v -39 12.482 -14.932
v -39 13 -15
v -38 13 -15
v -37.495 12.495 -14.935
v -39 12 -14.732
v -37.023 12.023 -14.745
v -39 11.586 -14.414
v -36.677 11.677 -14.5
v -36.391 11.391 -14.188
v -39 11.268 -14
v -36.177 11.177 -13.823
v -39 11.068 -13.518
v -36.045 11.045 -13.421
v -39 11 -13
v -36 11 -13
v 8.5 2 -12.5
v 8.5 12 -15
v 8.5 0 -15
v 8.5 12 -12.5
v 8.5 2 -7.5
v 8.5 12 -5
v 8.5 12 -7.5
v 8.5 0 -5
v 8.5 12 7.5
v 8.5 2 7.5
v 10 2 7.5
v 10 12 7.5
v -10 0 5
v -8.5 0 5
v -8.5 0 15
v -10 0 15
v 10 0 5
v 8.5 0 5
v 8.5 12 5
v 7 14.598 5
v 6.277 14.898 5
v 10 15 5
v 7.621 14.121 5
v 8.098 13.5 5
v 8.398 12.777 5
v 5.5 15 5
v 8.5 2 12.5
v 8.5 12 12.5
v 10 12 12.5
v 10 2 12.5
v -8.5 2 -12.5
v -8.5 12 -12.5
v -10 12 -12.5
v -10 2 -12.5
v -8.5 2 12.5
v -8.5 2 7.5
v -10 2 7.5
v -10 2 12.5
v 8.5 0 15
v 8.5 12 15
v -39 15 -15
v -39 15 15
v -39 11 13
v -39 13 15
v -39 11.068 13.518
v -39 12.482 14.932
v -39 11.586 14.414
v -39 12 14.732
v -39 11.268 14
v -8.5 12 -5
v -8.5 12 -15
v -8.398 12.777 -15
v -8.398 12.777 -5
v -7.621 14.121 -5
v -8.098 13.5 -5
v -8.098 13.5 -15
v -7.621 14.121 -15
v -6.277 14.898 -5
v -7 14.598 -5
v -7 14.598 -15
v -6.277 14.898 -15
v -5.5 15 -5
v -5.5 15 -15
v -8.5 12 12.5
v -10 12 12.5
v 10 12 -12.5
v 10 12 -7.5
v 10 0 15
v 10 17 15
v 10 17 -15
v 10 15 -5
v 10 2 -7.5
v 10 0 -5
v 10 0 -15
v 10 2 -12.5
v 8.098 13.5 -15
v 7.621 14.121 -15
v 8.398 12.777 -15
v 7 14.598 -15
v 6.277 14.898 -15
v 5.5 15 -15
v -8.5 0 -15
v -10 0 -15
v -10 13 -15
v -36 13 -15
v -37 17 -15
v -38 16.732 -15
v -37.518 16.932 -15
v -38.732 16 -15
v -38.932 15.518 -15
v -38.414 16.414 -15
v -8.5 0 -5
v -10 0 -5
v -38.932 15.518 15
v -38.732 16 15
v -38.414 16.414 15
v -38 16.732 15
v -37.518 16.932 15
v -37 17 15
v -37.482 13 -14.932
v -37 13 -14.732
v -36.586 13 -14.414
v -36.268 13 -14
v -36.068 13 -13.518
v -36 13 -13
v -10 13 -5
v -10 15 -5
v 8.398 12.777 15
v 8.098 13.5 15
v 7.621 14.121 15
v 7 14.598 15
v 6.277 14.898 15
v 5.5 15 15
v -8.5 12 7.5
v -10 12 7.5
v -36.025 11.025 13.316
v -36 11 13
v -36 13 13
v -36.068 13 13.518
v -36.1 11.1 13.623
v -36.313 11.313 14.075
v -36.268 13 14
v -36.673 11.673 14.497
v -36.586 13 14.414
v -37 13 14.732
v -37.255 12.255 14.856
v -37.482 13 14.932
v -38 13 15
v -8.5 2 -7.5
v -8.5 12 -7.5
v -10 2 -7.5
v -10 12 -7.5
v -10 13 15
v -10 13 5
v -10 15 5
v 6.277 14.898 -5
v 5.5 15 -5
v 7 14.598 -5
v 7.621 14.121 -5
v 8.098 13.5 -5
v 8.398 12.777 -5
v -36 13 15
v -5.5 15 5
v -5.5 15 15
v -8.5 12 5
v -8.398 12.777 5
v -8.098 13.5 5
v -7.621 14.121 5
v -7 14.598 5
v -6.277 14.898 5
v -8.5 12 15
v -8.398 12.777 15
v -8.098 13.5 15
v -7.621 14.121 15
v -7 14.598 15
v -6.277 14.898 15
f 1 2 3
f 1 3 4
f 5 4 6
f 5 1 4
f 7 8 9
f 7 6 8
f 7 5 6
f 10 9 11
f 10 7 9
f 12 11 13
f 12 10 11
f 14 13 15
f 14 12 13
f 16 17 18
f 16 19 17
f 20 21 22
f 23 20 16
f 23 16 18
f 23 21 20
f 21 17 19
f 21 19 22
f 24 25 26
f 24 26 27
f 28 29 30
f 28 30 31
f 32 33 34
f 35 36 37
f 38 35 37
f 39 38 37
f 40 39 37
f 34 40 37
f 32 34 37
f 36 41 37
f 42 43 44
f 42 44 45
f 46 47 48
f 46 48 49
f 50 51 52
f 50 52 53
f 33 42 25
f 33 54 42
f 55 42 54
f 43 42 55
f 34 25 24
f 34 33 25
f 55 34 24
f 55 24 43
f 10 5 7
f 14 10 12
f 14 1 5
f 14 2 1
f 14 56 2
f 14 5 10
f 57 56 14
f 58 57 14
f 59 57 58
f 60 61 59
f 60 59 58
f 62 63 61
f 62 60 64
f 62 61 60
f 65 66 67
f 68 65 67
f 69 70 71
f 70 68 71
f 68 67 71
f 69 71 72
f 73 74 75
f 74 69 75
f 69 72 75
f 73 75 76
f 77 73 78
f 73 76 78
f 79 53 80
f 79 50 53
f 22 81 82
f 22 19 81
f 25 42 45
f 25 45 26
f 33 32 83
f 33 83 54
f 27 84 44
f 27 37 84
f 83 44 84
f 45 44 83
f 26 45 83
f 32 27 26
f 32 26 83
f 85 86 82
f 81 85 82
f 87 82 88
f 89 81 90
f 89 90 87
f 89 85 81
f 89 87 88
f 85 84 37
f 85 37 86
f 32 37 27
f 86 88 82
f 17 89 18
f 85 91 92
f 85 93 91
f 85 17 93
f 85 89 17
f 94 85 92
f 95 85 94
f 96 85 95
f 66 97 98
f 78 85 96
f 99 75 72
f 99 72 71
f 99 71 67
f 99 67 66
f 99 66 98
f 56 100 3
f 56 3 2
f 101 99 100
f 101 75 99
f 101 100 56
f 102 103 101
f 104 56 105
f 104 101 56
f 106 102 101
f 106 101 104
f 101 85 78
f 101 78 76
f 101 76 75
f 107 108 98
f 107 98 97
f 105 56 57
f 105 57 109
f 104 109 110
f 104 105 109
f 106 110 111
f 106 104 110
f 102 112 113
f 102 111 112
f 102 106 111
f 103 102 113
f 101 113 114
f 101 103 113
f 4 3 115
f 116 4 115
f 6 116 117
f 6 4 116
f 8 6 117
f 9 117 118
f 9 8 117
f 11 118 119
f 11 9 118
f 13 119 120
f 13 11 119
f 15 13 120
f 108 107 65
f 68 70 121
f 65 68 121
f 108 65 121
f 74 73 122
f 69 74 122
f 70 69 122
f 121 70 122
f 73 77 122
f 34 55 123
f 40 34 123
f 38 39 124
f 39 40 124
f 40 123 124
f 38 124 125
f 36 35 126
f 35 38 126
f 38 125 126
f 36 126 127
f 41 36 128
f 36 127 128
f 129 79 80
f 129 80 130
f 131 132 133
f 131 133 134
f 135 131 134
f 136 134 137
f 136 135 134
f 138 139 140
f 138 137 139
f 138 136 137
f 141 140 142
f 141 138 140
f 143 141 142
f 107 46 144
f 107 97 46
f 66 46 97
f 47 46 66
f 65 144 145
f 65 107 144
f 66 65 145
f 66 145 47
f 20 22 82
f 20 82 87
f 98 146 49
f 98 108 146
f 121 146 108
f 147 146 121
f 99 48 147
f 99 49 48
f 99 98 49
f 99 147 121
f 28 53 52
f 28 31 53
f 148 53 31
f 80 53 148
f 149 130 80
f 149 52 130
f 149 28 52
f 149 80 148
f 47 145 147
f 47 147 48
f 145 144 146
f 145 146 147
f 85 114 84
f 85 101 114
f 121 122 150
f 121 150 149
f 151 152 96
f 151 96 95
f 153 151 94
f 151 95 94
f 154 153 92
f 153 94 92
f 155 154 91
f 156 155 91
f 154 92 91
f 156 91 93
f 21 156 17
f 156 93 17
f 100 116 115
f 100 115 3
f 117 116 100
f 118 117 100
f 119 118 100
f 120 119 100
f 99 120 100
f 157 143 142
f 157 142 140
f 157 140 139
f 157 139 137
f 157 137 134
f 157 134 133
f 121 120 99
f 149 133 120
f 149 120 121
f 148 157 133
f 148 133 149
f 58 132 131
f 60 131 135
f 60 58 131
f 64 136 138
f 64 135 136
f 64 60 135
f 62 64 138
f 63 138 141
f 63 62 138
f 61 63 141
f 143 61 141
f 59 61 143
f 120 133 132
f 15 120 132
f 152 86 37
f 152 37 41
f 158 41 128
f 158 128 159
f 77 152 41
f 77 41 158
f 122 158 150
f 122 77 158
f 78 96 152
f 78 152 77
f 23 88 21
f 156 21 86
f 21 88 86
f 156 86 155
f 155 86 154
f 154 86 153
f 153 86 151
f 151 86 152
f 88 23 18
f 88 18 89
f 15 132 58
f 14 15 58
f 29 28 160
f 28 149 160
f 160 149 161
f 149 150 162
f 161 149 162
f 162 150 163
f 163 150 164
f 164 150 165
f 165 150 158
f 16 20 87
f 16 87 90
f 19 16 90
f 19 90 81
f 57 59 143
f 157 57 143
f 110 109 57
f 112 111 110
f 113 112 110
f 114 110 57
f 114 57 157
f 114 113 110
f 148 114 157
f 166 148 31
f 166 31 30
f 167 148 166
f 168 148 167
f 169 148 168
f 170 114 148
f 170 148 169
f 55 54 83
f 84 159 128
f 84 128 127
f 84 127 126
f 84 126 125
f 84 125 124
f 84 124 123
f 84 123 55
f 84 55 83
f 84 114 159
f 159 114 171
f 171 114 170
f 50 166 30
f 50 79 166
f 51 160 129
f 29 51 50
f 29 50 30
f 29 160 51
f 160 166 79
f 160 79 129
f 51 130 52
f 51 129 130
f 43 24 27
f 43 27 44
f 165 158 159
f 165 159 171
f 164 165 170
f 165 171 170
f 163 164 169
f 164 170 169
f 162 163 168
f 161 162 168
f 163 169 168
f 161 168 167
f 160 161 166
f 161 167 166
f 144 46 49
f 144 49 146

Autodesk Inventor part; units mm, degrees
ref_plane "YZ Plane" through (0, 0, 0) normal (1, 0, 0) x (0, 1, 0)
ref_plane "XZ Plane" through (0, 0, 0) normal (0, 1, 0) x (-1, 0, 0)
ref_plane "XY Plane" through (0, 0, 0) normal (0, 0, 1) x (1, 0, 0)
sketch "スケッチ1" plane through (0, 0, 0) normal (0, 0, 1) x (1, 0, 0)
  line L0 (-10, 17) -> (0, 17)
  line L1 (0, 17) -> (0, 15)
  line L2 (0, 15) -> (-10, 15)
  line L3 (-10, 15) -> (-10, 17)
  line L4 (0, -3.4) -> (0, 20.4) projected
  point P0 (0, 0)
  dimension "d0" = 10
  dimension "d1" = 2
  dimension "d2" = 15
extrude "押し出し1" add sketch "スケッチ1" along normal blind 5
sketch "スケッチ2" plane through (0, 0, 5) normal (0, 0, 1) x (1, 0, 0)
  line L0 (0, 17) -> (-10, 17) projected
  line L1 (-10, 17) -> (-8.5, 17)
  line L2 (-8.5, 17) -> (-8.5, 0)
  line L3 (-8.5, 0) -> (-10, 0)
  line L4 (-10, 0) -> (-10, 17)
  line L5 (-10, 15) -> (0, 15) projected
  line L6 (0, 15) -> (0, 17) projected
  line L7 (0, 17) -> (-10, 17) projected
  line L8 (-10, 17) -> (-10, 15) projected
  point P0 (0, 0)
  point P1 (-8.5, 15)
  dimension "d5" = 1.5
extrude "押し出し2" add sketch "スケッチ2" along normal blind 10
sketch "スケッチ3" plane through (-8.5, 0, 5) normal (1, 0, 0) x (0, 0, -1)
  line L0 (-7.5, 12) -> (-2.5, 12)
  line L1 (-2.5, 12) -> (-2.5, 2)
  line L2 (-2.5, 2) -> (-7.5, 2)
  line L3 (-7.5, 2) -> (-7.5, 12)
  line L4 (0, 0) -> (-10, 0) projected
  line L5 (0, 15) -> (-10, 15) projected
  point P0 (5, 0)
  point P1 (-5, 2)
  point P2 (-5, 0)
  dimension "d8" = 2
  dimension "d9" = 5
  dimension "d13" = 3
extrude "押し出し3" cut sketch "スケッチ3" against normal through all
fillet "フィレット1" radius 3 1 edges at (-8.5, 15, 10)
mirror "ミラー1" about plane through (0, 15, 0) normal (1, 0, 0)
mirror "ミラー2" about plane through (-5, 16, 0) normal (0, 0, -1)
sketch "スケッチ4" plane through (0, 0, 15) normal (0, 0, 1) x (1, 0, 0)
  line L0 (-10, 17) -> (-10, 0) projected
  line L1 (-10, 17) -> (-39, 17)
  line L2 (-39, 17) -> (-39, 13)
  line L3 (-39, 13) -> (-10, 13)
  line L4 (-10, 13) -> (-10, 17)
  line L5 (-39, 17) -> (-36, 17)
  line L6 (-36, 17) -> (-36, 11)
  line L7 (-36, 11) -> (-39, 11)
  line L8 (-39, 11) -> (-39, 17)
  point P0 (0, 0)
  point P1 (-36, 13)
  dimension "d14" = 4
  dimension "d15" = 3
  dimension "d16" = 26
  dimension "d17" = 6
extrude "押し出し4" add sketch "スケッチ4" against normal up to surface (30 mm away)
fillet "フィレット2" radius 2 1 edges at (-39, 17, 0)
fillet "フィレット3" radius 2 4 edges at (-36, 12, 15) (-37.5, 11, 15) (-37.5, 11, -15) (-36, 12, -15)
properties part number "connetcor_female_cover"
